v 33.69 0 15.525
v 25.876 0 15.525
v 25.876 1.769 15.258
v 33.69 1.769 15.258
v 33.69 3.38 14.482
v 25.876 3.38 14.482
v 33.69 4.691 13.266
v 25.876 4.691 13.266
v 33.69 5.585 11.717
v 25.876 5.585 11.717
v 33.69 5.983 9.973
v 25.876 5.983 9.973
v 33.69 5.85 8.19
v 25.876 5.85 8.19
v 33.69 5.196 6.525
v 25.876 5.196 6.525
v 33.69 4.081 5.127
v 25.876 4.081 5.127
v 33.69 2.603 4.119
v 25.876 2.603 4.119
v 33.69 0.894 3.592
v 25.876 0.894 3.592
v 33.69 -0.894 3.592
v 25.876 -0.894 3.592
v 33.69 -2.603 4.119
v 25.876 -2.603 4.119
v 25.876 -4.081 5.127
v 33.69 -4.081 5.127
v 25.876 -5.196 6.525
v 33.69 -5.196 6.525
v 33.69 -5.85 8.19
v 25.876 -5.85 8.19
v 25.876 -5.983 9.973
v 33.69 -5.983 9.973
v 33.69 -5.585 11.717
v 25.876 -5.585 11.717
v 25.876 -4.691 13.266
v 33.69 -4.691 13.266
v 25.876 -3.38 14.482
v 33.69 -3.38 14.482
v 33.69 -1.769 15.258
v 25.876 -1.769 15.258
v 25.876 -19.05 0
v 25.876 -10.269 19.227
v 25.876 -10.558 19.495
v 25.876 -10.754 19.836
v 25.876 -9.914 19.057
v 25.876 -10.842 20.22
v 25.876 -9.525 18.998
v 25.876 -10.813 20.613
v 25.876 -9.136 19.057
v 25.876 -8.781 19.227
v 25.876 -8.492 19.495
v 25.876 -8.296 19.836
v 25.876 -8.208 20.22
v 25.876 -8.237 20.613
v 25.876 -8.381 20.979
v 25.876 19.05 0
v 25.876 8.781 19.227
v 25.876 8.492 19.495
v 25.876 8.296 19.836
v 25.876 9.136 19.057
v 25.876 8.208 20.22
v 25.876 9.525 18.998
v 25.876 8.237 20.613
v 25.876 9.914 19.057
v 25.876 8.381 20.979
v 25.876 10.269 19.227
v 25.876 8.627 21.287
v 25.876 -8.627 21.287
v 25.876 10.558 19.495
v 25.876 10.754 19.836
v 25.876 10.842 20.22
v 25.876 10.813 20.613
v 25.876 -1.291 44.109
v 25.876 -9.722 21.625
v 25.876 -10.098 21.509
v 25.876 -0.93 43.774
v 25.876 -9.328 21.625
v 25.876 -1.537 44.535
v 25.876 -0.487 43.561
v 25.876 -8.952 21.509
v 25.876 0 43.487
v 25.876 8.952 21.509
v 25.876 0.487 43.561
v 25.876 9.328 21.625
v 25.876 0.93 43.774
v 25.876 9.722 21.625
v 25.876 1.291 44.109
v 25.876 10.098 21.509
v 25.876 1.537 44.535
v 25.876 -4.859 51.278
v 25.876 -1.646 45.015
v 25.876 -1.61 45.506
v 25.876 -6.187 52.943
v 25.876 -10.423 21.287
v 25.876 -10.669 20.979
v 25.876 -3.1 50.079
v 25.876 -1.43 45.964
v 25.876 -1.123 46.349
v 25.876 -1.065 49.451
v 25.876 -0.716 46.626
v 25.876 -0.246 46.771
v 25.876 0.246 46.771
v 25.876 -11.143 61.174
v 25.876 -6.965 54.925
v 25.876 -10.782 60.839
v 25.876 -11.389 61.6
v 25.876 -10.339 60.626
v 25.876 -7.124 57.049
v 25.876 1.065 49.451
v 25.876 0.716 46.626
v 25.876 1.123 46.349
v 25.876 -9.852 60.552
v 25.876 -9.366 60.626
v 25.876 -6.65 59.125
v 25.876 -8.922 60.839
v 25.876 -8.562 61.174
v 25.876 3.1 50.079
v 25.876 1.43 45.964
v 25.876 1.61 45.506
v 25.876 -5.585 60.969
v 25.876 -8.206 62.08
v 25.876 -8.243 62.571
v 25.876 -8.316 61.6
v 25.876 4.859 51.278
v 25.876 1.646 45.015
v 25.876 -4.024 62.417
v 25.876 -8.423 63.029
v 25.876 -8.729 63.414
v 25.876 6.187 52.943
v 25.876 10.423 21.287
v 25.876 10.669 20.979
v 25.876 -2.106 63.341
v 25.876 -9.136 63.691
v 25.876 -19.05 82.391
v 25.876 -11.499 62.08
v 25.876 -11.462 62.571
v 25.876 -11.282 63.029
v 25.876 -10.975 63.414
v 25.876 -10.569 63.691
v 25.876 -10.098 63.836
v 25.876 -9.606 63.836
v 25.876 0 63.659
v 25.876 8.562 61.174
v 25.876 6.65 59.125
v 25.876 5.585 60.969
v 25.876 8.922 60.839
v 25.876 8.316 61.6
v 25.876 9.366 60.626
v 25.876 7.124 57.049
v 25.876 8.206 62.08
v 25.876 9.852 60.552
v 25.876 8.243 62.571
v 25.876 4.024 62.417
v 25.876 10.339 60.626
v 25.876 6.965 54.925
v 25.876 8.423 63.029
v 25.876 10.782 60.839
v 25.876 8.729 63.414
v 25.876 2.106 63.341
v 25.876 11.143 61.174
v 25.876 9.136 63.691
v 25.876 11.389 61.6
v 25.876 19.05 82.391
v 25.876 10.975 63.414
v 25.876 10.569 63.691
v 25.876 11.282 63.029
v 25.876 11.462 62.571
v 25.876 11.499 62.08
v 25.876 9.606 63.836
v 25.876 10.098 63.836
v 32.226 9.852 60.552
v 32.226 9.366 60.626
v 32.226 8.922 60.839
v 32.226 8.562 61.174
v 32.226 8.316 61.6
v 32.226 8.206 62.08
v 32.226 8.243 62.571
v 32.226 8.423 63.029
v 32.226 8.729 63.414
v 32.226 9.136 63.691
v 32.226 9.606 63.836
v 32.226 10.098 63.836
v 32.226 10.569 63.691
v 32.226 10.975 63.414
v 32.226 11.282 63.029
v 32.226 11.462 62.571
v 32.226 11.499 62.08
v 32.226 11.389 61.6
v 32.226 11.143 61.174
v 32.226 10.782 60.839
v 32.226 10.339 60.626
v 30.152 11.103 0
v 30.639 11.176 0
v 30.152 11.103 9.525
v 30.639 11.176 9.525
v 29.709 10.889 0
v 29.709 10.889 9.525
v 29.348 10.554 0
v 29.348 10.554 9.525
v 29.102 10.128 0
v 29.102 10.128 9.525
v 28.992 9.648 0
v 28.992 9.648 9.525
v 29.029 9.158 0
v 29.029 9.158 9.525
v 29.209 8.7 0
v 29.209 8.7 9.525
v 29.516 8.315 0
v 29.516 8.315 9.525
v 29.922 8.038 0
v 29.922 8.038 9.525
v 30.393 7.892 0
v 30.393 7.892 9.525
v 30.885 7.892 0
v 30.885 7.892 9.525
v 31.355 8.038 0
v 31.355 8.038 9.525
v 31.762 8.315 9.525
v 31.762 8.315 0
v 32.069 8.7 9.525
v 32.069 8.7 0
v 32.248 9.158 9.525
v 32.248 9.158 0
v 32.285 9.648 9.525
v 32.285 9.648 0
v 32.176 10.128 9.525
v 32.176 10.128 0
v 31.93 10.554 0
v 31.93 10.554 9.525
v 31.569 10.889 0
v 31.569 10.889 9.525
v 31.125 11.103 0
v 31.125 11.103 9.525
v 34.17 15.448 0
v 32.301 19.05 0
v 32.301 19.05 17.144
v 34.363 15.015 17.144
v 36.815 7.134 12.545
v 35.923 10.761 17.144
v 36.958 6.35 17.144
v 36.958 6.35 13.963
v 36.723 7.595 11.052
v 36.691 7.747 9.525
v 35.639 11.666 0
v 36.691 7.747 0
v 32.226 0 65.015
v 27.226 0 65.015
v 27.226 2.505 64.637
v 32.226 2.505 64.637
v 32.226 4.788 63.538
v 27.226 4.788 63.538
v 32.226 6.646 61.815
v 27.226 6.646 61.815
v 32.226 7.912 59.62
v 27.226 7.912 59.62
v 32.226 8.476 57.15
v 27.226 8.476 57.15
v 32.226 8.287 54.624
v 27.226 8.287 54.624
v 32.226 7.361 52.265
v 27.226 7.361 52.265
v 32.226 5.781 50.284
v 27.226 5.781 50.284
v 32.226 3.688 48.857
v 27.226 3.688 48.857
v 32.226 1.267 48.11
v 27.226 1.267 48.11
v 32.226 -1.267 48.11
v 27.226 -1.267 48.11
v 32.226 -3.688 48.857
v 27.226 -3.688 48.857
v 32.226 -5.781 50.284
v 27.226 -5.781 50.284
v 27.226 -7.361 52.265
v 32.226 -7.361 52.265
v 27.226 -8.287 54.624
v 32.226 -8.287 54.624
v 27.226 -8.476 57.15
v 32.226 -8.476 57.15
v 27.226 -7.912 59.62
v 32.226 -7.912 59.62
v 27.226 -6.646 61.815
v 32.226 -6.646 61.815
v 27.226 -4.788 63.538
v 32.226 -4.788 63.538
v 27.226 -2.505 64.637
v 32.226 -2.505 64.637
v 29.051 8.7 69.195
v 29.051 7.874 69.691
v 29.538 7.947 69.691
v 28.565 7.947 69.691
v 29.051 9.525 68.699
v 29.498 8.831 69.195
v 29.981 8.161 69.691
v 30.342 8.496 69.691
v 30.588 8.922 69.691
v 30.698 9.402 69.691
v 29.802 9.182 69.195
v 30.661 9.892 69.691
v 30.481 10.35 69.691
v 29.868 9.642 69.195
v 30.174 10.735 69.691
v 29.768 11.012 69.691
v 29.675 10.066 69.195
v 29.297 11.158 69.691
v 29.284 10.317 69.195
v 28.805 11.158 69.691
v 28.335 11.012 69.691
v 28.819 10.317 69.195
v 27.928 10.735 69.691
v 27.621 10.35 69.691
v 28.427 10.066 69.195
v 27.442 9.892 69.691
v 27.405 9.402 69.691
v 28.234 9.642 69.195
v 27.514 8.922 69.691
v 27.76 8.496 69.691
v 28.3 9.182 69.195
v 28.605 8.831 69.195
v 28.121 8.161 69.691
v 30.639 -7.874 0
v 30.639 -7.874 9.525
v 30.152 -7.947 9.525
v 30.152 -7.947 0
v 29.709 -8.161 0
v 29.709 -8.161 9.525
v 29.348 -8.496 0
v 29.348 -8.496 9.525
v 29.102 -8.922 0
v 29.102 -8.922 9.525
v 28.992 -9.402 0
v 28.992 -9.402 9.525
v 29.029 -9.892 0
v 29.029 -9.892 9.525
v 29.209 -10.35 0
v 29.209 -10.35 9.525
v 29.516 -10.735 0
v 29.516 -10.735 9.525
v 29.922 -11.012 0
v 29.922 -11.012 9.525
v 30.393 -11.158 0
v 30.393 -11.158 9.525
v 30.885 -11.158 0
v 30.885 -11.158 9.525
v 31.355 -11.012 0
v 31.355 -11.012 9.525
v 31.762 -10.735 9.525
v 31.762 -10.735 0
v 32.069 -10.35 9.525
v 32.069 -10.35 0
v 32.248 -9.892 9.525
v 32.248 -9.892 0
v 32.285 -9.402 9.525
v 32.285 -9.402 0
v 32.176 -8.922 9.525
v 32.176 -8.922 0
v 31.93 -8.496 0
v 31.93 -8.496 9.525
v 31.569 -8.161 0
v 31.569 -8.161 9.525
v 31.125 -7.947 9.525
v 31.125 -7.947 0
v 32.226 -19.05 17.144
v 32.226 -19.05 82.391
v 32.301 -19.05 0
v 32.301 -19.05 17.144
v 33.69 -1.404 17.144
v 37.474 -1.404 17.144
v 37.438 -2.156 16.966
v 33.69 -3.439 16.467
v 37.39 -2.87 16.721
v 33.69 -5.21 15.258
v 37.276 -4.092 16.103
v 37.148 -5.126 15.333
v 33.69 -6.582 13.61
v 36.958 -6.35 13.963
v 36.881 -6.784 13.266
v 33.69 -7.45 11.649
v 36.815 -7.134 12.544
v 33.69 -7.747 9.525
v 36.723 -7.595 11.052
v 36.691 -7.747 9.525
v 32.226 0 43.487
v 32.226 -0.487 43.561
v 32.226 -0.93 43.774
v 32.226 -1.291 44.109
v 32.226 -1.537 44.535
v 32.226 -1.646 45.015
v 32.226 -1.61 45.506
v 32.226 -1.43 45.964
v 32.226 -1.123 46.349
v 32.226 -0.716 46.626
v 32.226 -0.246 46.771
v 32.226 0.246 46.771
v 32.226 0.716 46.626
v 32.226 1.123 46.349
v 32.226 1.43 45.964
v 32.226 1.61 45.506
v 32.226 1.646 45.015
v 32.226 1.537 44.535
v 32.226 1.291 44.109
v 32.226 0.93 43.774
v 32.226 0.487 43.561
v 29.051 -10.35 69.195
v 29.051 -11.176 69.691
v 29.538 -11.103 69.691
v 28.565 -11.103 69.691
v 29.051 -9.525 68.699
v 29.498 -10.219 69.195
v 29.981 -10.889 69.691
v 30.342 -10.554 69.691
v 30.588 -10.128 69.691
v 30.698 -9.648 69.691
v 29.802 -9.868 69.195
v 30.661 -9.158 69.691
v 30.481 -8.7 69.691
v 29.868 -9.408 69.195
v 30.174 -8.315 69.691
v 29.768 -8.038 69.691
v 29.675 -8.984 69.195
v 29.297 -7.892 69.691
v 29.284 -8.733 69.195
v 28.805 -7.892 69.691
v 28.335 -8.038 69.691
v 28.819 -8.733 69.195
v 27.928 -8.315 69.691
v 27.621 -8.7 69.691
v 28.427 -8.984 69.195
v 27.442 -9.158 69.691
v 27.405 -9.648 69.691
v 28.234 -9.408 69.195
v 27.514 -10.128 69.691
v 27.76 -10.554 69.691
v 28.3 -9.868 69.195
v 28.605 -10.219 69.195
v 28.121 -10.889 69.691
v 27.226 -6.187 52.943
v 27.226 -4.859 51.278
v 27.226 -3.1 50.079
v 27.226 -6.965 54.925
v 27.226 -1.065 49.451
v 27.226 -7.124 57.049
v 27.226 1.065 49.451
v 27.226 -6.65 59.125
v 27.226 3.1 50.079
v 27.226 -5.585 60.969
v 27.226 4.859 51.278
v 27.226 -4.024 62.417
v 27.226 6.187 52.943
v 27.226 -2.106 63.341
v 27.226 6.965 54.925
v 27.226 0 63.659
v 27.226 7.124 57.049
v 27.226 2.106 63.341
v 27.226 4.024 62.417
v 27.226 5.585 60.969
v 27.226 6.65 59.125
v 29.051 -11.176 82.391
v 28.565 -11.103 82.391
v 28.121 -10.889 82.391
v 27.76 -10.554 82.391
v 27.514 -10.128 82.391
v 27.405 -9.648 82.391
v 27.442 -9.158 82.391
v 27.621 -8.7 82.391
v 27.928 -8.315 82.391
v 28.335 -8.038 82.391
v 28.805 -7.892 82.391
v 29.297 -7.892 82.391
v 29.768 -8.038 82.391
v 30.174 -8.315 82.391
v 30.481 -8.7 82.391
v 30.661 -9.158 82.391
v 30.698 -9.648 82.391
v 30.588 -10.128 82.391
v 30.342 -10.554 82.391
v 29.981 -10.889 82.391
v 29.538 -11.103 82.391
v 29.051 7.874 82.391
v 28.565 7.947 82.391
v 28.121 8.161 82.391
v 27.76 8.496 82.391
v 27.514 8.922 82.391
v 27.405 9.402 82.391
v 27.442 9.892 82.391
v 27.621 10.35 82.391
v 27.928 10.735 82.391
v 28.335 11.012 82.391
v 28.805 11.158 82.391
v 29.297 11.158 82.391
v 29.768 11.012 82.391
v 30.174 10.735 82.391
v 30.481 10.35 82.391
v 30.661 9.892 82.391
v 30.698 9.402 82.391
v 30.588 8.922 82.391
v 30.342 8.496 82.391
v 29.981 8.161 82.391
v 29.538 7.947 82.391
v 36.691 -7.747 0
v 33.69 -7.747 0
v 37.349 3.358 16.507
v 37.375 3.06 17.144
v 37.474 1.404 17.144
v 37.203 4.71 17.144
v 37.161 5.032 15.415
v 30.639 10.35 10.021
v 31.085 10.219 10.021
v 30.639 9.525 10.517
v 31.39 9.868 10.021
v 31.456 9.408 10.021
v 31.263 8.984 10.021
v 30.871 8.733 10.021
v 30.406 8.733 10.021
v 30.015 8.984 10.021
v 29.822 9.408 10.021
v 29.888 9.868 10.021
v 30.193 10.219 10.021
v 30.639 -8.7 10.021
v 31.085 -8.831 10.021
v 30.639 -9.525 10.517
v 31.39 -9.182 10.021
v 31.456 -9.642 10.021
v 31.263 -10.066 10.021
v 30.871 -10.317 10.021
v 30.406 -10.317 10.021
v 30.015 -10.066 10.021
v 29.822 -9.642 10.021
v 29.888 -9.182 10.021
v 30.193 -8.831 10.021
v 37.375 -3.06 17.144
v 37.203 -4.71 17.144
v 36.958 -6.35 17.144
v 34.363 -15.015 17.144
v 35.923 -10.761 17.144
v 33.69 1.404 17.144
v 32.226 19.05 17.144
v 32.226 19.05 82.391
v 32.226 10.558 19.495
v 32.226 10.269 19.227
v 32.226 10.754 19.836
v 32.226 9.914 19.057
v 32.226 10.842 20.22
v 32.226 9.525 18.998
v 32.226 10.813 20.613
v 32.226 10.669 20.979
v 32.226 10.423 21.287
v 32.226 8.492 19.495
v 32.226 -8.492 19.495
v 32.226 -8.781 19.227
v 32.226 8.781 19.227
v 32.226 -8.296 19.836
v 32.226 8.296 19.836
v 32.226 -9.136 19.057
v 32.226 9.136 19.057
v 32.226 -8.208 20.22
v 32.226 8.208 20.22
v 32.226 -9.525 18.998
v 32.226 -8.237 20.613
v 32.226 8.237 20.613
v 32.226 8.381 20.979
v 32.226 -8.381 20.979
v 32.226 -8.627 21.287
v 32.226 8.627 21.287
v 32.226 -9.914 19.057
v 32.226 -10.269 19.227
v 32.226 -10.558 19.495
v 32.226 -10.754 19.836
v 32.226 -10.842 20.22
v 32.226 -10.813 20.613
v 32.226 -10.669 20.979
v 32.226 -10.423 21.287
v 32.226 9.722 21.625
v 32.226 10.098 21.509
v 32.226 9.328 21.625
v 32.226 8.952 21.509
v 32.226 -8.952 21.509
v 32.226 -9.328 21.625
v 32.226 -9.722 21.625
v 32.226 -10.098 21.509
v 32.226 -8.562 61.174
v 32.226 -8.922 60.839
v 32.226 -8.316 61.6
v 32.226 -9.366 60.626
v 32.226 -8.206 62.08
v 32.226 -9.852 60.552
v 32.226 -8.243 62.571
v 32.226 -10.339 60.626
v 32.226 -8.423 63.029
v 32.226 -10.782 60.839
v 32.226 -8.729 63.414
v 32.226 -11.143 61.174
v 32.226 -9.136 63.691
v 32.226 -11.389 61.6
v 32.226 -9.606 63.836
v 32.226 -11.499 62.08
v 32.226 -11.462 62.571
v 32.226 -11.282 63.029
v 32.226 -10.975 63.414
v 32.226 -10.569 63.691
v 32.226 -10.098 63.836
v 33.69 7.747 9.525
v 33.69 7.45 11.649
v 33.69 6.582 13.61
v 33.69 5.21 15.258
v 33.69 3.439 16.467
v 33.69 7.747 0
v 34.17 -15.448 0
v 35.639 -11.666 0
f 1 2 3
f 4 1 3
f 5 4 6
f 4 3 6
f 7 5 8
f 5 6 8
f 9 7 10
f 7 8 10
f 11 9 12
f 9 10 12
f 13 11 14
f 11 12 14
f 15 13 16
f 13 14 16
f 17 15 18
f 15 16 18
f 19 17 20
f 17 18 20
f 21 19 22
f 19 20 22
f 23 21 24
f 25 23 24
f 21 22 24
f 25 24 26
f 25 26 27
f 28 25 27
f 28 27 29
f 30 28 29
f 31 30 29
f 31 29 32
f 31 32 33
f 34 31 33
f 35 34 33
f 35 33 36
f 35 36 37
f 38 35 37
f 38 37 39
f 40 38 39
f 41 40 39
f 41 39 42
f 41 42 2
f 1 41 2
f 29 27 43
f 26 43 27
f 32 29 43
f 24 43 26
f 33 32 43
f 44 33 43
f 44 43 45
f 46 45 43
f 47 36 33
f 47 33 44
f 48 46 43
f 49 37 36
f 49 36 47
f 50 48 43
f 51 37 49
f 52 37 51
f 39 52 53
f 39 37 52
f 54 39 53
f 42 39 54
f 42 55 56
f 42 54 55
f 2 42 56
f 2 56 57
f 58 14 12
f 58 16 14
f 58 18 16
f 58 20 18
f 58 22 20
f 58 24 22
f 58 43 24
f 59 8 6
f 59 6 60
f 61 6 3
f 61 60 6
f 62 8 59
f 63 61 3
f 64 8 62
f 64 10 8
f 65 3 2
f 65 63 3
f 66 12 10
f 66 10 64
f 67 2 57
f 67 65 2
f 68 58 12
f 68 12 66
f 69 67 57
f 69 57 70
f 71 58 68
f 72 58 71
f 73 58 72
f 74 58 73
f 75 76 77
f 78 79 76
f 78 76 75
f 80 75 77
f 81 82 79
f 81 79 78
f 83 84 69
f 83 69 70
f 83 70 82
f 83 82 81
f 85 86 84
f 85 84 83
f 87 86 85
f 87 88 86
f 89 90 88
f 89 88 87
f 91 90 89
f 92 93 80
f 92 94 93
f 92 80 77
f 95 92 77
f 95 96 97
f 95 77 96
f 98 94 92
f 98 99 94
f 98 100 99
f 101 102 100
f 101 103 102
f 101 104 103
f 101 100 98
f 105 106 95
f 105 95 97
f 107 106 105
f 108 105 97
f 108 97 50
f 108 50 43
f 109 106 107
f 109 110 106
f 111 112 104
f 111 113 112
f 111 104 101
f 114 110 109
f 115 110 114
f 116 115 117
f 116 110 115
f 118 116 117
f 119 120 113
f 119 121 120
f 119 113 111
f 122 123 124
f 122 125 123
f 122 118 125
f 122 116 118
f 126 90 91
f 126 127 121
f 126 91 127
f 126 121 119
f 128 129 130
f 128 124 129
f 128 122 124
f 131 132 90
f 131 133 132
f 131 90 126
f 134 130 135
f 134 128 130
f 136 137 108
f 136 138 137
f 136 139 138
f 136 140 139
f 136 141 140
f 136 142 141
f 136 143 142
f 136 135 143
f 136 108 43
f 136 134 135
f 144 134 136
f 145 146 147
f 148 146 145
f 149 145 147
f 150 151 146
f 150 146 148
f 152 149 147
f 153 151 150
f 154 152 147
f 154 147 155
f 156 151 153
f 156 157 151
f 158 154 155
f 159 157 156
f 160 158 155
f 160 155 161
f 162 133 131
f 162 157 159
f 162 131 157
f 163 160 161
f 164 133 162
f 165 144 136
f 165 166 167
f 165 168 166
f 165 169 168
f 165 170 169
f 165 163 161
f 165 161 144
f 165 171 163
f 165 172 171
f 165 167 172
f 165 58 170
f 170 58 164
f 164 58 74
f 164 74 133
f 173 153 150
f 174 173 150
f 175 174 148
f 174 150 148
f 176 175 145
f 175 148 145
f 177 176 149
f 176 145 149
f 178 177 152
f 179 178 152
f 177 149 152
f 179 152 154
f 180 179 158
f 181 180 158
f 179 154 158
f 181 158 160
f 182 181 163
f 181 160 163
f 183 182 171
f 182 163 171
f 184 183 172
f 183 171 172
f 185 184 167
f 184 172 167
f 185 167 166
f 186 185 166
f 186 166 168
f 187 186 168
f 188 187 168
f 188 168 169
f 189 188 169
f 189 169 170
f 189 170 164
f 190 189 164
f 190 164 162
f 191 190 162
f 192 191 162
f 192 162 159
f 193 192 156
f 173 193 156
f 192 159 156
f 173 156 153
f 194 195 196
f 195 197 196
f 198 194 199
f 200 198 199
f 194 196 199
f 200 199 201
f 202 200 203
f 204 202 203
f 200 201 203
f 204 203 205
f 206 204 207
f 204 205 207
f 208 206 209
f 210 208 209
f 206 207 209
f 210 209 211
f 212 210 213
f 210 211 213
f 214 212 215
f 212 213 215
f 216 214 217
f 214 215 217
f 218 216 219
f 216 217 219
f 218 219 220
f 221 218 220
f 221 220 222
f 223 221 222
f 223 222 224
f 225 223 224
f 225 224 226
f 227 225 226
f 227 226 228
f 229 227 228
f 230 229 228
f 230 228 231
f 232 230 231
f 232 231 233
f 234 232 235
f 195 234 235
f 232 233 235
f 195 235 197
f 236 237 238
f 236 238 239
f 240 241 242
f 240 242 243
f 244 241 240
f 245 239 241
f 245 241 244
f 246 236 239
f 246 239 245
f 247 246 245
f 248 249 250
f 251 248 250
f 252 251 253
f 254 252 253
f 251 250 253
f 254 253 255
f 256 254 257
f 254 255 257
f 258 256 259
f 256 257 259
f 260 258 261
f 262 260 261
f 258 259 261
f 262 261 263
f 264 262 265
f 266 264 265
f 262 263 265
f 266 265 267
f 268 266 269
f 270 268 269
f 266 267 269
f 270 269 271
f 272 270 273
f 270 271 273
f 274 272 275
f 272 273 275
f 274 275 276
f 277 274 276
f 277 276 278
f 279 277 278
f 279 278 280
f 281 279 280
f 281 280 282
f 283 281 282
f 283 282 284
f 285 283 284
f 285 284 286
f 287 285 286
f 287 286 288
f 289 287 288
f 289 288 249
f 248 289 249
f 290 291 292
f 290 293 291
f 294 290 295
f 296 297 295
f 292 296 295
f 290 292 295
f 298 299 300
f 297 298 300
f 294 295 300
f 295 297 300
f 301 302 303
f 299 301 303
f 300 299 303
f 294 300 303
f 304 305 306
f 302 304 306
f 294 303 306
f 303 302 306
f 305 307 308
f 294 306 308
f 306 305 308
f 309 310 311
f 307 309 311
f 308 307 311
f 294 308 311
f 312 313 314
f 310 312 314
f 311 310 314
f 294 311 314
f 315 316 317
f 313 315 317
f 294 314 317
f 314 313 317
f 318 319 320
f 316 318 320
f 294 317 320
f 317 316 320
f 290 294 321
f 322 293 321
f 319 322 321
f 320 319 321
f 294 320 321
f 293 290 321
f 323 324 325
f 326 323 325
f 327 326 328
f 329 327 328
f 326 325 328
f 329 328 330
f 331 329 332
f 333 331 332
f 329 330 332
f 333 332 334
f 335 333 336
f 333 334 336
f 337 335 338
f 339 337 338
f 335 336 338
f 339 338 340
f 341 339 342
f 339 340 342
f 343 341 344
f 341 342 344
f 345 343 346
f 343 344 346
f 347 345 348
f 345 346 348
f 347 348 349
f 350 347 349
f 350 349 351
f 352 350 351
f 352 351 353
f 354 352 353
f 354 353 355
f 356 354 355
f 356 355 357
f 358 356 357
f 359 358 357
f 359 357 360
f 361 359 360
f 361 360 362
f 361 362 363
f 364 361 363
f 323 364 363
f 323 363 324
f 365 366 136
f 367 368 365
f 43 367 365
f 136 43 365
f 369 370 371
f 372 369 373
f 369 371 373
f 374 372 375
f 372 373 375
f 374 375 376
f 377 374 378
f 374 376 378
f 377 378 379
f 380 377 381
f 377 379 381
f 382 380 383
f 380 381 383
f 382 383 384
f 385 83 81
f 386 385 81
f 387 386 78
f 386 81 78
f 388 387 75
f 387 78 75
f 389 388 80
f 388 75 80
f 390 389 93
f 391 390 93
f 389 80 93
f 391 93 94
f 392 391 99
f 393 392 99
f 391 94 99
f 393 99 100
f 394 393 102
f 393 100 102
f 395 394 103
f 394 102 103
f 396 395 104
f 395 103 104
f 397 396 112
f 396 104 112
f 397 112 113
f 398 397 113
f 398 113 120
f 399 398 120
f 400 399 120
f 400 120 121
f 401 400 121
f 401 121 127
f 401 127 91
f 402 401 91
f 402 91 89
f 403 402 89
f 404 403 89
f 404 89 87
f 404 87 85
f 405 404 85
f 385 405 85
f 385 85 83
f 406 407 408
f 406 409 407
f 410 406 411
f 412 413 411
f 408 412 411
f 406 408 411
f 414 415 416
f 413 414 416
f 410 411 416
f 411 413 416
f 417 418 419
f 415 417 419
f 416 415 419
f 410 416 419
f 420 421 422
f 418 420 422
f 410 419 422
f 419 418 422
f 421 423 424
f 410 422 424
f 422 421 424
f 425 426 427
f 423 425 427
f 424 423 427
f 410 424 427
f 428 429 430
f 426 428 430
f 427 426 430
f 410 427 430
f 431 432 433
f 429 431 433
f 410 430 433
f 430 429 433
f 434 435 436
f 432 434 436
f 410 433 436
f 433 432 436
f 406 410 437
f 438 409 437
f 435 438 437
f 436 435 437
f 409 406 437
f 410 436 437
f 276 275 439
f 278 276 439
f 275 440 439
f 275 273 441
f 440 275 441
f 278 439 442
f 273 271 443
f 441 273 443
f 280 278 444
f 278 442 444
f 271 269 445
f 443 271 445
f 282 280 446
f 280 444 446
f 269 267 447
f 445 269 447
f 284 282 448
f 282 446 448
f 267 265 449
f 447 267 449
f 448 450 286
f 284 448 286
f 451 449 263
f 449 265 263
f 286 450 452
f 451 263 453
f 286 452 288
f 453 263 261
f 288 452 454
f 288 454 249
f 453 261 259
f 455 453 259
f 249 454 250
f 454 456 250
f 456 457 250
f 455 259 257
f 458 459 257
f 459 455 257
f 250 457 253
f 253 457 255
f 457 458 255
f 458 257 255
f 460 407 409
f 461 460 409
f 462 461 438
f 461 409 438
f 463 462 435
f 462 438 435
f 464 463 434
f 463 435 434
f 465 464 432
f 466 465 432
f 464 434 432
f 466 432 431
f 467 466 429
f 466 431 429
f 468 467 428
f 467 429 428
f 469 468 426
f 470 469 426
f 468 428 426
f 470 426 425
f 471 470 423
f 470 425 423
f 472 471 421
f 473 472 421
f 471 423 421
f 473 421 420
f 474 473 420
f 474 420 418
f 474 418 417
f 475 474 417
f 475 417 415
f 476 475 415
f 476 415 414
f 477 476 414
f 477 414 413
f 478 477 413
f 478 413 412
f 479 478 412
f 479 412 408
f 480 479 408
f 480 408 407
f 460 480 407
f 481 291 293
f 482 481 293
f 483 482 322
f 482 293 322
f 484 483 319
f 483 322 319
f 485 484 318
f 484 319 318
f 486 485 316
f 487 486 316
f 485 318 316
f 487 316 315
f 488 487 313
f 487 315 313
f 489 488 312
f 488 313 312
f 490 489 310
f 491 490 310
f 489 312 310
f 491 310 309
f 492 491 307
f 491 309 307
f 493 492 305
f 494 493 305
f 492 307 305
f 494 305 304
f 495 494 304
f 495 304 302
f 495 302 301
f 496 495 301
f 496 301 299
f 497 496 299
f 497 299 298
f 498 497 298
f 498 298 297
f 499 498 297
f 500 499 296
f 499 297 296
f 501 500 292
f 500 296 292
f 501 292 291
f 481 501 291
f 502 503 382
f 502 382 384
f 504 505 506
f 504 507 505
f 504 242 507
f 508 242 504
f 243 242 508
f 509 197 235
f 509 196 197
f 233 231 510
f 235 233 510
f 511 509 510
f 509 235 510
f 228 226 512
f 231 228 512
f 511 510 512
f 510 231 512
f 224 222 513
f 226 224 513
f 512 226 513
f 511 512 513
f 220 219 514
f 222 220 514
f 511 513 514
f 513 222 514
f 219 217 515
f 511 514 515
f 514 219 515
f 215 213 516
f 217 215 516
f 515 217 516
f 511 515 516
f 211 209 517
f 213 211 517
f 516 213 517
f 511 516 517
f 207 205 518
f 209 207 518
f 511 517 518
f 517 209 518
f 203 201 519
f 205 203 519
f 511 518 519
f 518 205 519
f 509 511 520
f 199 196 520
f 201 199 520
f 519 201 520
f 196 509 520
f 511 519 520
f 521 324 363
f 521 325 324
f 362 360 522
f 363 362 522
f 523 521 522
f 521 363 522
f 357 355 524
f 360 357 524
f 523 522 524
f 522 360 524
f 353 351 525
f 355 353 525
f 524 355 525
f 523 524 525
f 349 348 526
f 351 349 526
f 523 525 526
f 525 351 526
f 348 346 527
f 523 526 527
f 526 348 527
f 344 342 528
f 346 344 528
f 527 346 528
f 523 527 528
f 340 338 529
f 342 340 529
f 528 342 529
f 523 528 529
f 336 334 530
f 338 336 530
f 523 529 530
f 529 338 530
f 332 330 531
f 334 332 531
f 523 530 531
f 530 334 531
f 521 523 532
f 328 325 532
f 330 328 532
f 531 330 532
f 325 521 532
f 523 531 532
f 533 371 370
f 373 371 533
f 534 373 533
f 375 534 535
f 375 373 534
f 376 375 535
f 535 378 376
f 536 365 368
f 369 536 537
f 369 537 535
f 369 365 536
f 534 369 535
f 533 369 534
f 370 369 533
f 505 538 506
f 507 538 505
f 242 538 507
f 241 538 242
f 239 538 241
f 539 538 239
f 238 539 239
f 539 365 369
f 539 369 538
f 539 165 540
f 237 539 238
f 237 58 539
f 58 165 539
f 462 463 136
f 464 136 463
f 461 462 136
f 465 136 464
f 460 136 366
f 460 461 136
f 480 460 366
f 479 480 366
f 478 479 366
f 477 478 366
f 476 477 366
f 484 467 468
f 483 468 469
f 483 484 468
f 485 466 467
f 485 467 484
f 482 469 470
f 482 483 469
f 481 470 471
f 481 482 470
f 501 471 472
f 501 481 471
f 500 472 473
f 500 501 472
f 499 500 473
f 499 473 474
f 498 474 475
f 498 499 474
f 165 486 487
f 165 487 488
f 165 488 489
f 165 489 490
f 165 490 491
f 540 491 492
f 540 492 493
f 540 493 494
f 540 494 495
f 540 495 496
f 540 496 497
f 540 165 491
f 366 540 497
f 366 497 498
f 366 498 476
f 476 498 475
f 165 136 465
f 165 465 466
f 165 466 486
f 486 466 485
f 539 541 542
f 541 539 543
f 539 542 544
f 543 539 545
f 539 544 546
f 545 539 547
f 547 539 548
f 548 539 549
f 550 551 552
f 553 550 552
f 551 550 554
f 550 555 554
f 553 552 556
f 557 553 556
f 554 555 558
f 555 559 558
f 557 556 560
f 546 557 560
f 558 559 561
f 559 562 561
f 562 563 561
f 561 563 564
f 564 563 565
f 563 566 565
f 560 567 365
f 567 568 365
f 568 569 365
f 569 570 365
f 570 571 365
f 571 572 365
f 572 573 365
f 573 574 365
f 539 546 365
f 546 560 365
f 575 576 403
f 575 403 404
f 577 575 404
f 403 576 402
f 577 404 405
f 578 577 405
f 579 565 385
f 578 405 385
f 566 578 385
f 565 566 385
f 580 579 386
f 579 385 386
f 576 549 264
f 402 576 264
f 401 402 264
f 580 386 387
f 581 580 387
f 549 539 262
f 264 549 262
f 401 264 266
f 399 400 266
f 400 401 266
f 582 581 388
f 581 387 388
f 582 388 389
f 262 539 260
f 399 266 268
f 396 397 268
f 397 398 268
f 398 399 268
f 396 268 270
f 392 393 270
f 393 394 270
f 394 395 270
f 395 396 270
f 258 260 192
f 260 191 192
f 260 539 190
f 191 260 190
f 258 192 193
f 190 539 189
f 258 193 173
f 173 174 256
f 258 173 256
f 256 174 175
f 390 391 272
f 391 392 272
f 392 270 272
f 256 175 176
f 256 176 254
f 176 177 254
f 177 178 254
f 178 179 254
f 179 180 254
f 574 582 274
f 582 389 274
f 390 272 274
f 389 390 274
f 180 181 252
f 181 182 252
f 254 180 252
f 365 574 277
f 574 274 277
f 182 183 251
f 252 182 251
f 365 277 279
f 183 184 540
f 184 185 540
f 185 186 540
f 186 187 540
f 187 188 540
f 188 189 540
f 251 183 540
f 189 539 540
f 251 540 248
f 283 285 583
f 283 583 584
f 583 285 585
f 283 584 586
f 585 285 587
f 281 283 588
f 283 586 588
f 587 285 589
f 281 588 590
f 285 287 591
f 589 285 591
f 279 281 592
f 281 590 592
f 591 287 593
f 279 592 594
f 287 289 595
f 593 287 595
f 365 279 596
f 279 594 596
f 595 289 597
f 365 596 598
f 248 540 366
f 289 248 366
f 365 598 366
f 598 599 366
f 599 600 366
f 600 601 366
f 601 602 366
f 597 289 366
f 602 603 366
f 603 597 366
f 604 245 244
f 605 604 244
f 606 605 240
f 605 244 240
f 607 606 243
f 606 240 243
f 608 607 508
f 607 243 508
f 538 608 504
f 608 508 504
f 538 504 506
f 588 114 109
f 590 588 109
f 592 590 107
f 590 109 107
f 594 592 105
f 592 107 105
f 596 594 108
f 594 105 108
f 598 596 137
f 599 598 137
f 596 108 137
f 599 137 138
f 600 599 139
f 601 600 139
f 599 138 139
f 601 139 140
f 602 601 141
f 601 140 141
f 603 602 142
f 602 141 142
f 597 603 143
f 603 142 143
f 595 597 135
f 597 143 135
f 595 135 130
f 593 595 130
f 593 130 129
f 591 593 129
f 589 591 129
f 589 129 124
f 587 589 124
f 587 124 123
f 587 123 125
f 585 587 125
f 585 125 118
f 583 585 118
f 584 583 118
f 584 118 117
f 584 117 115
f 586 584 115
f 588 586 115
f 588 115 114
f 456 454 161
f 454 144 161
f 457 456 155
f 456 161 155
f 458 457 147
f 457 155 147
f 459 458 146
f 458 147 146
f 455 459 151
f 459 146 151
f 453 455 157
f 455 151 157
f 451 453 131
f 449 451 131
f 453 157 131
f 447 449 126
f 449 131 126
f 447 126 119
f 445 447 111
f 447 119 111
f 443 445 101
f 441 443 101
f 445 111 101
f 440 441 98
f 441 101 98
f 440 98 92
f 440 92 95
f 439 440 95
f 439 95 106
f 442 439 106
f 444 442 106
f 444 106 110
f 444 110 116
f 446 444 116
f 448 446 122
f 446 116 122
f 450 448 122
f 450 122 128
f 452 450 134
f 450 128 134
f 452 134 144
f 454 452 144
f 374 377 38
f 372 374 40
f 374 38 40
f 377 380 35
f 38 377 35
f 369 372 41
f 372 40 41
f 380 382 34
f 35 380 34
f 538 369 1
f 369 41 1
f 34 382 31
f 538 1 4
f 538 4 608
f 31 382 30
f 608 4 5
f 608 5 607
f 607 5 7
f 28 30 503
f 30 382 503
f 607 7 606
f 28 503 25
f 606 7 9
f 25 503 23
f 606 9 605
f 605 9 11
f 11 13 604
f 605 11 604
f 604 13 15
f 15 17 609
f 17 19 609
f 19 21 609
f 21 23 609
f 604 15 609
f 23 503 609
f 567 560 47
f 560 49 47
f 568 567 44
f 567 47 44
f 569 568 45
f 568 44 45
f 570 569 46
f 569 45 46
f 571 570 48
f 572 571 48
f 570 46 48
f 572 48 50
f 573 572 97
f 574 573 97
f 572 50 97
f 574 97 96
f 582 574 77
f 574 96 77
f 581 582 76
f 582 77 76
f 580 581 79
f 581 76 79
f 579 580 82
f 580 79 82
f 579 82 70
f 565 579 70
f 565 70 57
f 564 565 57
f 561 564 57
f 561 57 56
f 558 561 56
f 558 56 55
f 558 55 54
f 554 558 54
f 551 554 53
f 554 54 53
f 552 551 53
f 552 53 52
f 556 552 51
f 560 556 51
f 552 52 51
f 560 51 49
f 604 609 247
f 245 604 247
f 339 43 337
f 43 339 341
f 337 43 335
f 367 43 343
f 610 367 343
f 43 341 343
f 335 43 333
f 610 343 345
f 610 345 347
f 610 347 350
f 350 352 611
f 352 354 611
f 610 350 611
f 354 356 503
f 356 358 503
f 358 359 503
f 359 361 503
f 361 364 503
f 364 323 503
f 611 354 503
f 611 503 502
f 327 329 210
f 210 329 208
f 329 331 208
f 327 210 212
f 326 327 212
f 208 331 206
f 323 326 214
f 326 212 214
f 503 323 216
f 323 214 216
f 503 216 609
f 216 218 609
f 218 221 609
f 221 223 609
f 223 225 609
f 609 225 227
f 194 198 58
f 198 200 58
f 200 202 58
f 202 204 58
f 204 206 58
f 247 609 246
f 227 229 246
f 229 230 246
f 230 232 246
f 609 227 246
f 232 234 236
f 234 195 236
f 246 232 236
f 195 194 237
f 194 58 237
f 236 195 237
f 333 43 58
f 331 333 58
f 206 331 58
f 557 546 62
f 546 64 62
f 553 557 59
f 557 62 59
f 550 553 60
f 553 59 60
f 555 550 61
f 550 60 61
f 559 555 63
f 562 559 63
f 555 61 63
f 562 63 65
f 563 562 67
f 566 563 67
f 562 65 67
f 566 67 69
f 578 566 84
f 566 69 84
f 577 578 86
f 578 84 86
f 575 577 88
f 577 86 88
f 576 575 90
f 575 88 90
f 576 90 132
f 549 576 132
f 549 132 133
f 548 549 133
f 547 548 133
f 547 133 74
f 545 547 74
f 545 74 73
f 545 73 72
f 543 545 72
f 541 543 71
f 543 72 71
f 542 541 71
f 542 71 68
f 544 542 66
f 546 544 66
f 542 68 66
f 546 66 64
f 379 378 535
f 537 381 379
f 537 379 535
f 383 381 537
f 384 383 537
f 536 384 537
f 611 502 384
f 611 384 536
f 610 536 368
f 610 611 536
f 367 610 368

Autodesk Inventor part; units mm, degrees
ref_plane "YZ Plane" through (0, 0, 0) normal (1, 0, 0) x (0, 1, 0)
ref_plane "XZ Plane" through (0, 0, 0) normal (0, 1, 0) x (-1, 0, 0)
ref_plane "XY Plane" through (0, 0, 0) normal (0, 0, 1) x (1, 0, 0)
sketch "Sketch1" plane through (0, 0, 0) normal (0, 0, 1) x (1, 0, 0)
  arc A0 (32.3009, 19.05) -> (32.3009, -19.05) centre (0, 0) ccw construction
  line L0 (0, 0) -> (25.8762, 0) construction
  line L1 (25.8762, 0) -> (25.8762, 19.05)
  line L2 (25.8762, 19.05) -> (32.3009, 19.05)
  line L3 (38.5763, 19.05) -> (38.5763, -19.05) construction
  line L4 (38.5763, -19.05) -> (32.3009, -19.05) construction
  line L5 (25.8762, -19.05) -> (25.8762, 0)
  line L6 (32.3009, 19.05) -> (38.5763, 19.05) construction
  line L7 (32.3009, -19.05) -> (25.8762, -19.05)
  arc A1 (32.3009, -19.05) -> (36.9585, -6.35) centre (0, 0) ccw
  line L8 (30.6388, 19.05) -> (30.6388, -19.05) construction
  line L9 (25.8762, 6.35) -> (36.9585, 6.35) construction
  line L10 (25.8762, -6.35) -> (36.9585, -6.35) construction
  arc A2 (36.9585, 6.35) -> (32.3009, 19.05) centre (0, 0) ccw
  arc A3 (36.9585, -6.35) -> (36.9585, 6.35) centre (0, 0) ccw
  line L11 (36.9585, 6.35) -> (36.9585, -6.35) construction
  point P0 (30.6388, 9.525)
  point P1 (30.6388, -9.525)
  dimension "d0" = 75
  dimension "d1" = 25.8762
  dimension "d2" = 19.05
  dimension "d3" = 19.05
  dimension "d4" = 12.7
  dimension "d5" = 4.7625
  dimension "d6" = 19.05
  dimension "d7" = 9.525
  dimension "d8" = 9.525
  dimension "d9" = 12.7
  dimension "d10" = 6.35
extrude "Extrusion1" add sketch "Sketch1" along normal blind 82.3912
hole "Hole1" at (30.6388, 9.525, 0) at (30.6388, -9.525, 0) direction (0, 0, 1) diameter 3.302 depth 9.525 tip angle 118 thread size "8-32 UNC" class "2B" standard "ANSI Unified Screw Threads"
sketch "Sketch2" plane through (25.8762, -19.05, 0) normal (-1, 0, 0) x (0, 0, 1)
  line L0 (0, 38.1) -> (82.3912, 38.1) projected
  line L1 (0, 19.05) -> (9.525, 19.05) construction
  circle A0 centre (9.525, 19.05) radius 6
  line L2 (82.3912, 38.1) -> (82.3912, 0) projected
  line L3 (9.525, 19.05) -> (56.515, 19.05) construction
  circle A1 centre (56.515, 19.05) radius 8.5
  circle A2 centre (9.525, 19.05) radius 25.4
  circle A3 centre (56.515, 19.05) radius 21.59
  circle A4 centre (56.515, 19.05) radius 7.1437
  dimension "d20" = 9.525
  dimension "d21" = 12
  dimension "d24" = 17
  dimension "d52" = 50.8
  dimension "d53" = 43.18
  dimension "d55" = 14.2875
extrude "Extrusion2" cut sketch "Sketch2" against normal through all contours A0 | A4
sketch "Sketch3" plane through (0, 0, 0) normal (0, 0, -1) x (-1, 0, 0)
  line L0 (-25.8762, -19.05) -> (-25.8762, 19.05) projected
  arc A0 (-32.3009, 19.05) -> (-32.3009, -19.05) centre (0, 0) ccw projected
  line L1 (-25.8762, 0) -> (-37.5, 0)
  line L2 (-33.69, 0) -> (-33.69, 7.747)
  line L3 (-33.69, 7.747) -> (-36.6911, 7.747)
  line L4 (-33.69, 0) -> (-33.69, -7.747)
  line L5 (-33.69, -7.747) -> (-36.6911, -7.747)
  line L6 (-37.5, 5.6093) -> (-37.5, -5.6093) construction
  dimension "d28" = 3.81
  dimension "d29" = 15.494
extrude "Extrusion3" cut sketch "Sketch3" against normal blind 17.272
fillet "Fillet1" radius 7.747 2 edges at (35.1905, -7.747, 17.272) (35.1905, 7.747, 17.272)
sketch "Sketch4" plane through (0, 0, 82.3912) normal (0, 0, 1) x (1, 0, 0)
  line L0 (25.8762, 19.05) -> (25.8762, -19.05) projected
  line L1 (25.8762, -19.05) -> (32.3009, -19.05) projected
  arc A0 (32.3009, -19.05) -> (32.3009, 19.05) centre (0, 0) ccw projected
  line L2 (32.3009, 19.05) -> (25.8762, 19.05) projected
  line L3 (32.2263, 19.05) -> (32.2263, -19.05)
  dimension "d33" = 6.35
extrude "Extrusion4" cut sketch "Sketch4" against normal blind 65.2475 contours L2 A0 L1 L3
sketch "Sketch5" plane through (32.2263, -19.05, 82.3912) normal (1, 0, 0) x (0, 0, -1)
  line L0 (65.2475, 0) -> (0, 0) projected
  line L1 (65.2475, 0) -> (65.2475, 38.1) projected
  line L2 (0, 38.1) -> (65.2475, 38.1) projected
  line L3 (58.8975, 38.1) -> (58.8975, 0)
  line L4 (62.0725, 38.1) -> (62.0725, 0)
  line L5 (58.8975, 19.05) -> (65.2475, 19.05)
  point P0 (82.3912, 19.05)
  point P1 (62.0725, 28.575)
  point P2 (62.0725, 9.525)
  dimension "d36" = 6.35
  dimension "d37" = 19.05
  dimension "d38" = 9.525
hole "Hole2" at (32.2263, 9.525, 20.3187) at (32.2263, -9.525, 20.3187) direction (-1, 0, 0) diameter 2.6416 end through all thread size "6-32 UNC" class "2B" standard "ANSI Unified Screw Threads"
extrude "Extrusion6" cut sketch "Sketch2" against normal through all contours A1
extrude "Extrusion7" add sketch "Sketch2" against normal blind 1.35 contours A1
sketch "Sketch7" plane through (0, 0, 82.3912) normal (0, 0, 1) x (1, 0, 0)
  line L0 (32.2263, -19.05) -> (32.2263, 19.05) projected
  line L1 (25.8762, 19.05) -> (25.8762, -19.05) projected
  line L2 (29.0512, 19.05) -> (29.0513, -19.05) construction
  line L3 (25.8762, 0) -> (32.2263, 0) construction
  line L4 (32.2263, 19.05) -> (25.8762, 19.05) projected
  point P0 (0, 0)
  point P1 (29.0513, 9.525)
  point P2 (29.0513, -9.525)
  dimension "d60" = 9.525
hole "Hole3" at (29.0513, 9.525, 82.3912) at (29.0513, -9.525, 82.3912) direction (0, 0, -1) diameter 3.302 depth 12.7 tip angle 118 thread size "8-32 UNC" class "2B" standard "ANSI Unified Screw Threads"
sketch "Sketch8" plane through (32.2263, -19.05, 82.3912) normal (1, 0, 0) x (0, 0, -1)
  circle A0 centre (25.8762, 19.05) radius 8.5 projected
  line L0 (0, 38.1) -> (65.2475, 38.1) projected
  circle A1 centre (25.8763, 19.05) radius 11.3766 construction
  line L1 (25.8763, 19.05) -> (37.2528, 19.05) construction
  line L2 (25.8763, 19.05) -> (20.188, 28.9024) construction
  line L3 (25.8763, 19.05) -> (20.188, 9.1976) construction
  circle A2 centre (37.2528, 19.05) radius 3.9688 construction
  circle A3 centre (37.2528, 19.05) radius 2.0828 construction
  point P0 (82.3912, 19.05)
  point P1 (35.17, 19.05)
  point P2 (34.3763, 19.05)
  point P3 (33.2841, 19.05)
  dimension "d70" = 7.9375
  dimension "d71" = 4.1656
  dimension "d68" = 120
  dimension "d69" = 120
  dimension "d72" = 1.0922
  dimension "d73" = 0.7937
hole "Hole4" at (32.2263, 0, 45.1384) at (32.2263, -9.8524, 62.2033) at (32.2263, 9.8524, 62.2033) direction (-1, 0, 0) diameter 3.302 end through all thread size "8-32 UNC" class "2B" standard "ANSI Unified Screw Threads"
equation "\"d3\" = d2"
equation "\"d6\" = 2 * d7"
equation "\"d7\" = d8"
properties part number "Module Side Beam" material "Aluminum 6061"
